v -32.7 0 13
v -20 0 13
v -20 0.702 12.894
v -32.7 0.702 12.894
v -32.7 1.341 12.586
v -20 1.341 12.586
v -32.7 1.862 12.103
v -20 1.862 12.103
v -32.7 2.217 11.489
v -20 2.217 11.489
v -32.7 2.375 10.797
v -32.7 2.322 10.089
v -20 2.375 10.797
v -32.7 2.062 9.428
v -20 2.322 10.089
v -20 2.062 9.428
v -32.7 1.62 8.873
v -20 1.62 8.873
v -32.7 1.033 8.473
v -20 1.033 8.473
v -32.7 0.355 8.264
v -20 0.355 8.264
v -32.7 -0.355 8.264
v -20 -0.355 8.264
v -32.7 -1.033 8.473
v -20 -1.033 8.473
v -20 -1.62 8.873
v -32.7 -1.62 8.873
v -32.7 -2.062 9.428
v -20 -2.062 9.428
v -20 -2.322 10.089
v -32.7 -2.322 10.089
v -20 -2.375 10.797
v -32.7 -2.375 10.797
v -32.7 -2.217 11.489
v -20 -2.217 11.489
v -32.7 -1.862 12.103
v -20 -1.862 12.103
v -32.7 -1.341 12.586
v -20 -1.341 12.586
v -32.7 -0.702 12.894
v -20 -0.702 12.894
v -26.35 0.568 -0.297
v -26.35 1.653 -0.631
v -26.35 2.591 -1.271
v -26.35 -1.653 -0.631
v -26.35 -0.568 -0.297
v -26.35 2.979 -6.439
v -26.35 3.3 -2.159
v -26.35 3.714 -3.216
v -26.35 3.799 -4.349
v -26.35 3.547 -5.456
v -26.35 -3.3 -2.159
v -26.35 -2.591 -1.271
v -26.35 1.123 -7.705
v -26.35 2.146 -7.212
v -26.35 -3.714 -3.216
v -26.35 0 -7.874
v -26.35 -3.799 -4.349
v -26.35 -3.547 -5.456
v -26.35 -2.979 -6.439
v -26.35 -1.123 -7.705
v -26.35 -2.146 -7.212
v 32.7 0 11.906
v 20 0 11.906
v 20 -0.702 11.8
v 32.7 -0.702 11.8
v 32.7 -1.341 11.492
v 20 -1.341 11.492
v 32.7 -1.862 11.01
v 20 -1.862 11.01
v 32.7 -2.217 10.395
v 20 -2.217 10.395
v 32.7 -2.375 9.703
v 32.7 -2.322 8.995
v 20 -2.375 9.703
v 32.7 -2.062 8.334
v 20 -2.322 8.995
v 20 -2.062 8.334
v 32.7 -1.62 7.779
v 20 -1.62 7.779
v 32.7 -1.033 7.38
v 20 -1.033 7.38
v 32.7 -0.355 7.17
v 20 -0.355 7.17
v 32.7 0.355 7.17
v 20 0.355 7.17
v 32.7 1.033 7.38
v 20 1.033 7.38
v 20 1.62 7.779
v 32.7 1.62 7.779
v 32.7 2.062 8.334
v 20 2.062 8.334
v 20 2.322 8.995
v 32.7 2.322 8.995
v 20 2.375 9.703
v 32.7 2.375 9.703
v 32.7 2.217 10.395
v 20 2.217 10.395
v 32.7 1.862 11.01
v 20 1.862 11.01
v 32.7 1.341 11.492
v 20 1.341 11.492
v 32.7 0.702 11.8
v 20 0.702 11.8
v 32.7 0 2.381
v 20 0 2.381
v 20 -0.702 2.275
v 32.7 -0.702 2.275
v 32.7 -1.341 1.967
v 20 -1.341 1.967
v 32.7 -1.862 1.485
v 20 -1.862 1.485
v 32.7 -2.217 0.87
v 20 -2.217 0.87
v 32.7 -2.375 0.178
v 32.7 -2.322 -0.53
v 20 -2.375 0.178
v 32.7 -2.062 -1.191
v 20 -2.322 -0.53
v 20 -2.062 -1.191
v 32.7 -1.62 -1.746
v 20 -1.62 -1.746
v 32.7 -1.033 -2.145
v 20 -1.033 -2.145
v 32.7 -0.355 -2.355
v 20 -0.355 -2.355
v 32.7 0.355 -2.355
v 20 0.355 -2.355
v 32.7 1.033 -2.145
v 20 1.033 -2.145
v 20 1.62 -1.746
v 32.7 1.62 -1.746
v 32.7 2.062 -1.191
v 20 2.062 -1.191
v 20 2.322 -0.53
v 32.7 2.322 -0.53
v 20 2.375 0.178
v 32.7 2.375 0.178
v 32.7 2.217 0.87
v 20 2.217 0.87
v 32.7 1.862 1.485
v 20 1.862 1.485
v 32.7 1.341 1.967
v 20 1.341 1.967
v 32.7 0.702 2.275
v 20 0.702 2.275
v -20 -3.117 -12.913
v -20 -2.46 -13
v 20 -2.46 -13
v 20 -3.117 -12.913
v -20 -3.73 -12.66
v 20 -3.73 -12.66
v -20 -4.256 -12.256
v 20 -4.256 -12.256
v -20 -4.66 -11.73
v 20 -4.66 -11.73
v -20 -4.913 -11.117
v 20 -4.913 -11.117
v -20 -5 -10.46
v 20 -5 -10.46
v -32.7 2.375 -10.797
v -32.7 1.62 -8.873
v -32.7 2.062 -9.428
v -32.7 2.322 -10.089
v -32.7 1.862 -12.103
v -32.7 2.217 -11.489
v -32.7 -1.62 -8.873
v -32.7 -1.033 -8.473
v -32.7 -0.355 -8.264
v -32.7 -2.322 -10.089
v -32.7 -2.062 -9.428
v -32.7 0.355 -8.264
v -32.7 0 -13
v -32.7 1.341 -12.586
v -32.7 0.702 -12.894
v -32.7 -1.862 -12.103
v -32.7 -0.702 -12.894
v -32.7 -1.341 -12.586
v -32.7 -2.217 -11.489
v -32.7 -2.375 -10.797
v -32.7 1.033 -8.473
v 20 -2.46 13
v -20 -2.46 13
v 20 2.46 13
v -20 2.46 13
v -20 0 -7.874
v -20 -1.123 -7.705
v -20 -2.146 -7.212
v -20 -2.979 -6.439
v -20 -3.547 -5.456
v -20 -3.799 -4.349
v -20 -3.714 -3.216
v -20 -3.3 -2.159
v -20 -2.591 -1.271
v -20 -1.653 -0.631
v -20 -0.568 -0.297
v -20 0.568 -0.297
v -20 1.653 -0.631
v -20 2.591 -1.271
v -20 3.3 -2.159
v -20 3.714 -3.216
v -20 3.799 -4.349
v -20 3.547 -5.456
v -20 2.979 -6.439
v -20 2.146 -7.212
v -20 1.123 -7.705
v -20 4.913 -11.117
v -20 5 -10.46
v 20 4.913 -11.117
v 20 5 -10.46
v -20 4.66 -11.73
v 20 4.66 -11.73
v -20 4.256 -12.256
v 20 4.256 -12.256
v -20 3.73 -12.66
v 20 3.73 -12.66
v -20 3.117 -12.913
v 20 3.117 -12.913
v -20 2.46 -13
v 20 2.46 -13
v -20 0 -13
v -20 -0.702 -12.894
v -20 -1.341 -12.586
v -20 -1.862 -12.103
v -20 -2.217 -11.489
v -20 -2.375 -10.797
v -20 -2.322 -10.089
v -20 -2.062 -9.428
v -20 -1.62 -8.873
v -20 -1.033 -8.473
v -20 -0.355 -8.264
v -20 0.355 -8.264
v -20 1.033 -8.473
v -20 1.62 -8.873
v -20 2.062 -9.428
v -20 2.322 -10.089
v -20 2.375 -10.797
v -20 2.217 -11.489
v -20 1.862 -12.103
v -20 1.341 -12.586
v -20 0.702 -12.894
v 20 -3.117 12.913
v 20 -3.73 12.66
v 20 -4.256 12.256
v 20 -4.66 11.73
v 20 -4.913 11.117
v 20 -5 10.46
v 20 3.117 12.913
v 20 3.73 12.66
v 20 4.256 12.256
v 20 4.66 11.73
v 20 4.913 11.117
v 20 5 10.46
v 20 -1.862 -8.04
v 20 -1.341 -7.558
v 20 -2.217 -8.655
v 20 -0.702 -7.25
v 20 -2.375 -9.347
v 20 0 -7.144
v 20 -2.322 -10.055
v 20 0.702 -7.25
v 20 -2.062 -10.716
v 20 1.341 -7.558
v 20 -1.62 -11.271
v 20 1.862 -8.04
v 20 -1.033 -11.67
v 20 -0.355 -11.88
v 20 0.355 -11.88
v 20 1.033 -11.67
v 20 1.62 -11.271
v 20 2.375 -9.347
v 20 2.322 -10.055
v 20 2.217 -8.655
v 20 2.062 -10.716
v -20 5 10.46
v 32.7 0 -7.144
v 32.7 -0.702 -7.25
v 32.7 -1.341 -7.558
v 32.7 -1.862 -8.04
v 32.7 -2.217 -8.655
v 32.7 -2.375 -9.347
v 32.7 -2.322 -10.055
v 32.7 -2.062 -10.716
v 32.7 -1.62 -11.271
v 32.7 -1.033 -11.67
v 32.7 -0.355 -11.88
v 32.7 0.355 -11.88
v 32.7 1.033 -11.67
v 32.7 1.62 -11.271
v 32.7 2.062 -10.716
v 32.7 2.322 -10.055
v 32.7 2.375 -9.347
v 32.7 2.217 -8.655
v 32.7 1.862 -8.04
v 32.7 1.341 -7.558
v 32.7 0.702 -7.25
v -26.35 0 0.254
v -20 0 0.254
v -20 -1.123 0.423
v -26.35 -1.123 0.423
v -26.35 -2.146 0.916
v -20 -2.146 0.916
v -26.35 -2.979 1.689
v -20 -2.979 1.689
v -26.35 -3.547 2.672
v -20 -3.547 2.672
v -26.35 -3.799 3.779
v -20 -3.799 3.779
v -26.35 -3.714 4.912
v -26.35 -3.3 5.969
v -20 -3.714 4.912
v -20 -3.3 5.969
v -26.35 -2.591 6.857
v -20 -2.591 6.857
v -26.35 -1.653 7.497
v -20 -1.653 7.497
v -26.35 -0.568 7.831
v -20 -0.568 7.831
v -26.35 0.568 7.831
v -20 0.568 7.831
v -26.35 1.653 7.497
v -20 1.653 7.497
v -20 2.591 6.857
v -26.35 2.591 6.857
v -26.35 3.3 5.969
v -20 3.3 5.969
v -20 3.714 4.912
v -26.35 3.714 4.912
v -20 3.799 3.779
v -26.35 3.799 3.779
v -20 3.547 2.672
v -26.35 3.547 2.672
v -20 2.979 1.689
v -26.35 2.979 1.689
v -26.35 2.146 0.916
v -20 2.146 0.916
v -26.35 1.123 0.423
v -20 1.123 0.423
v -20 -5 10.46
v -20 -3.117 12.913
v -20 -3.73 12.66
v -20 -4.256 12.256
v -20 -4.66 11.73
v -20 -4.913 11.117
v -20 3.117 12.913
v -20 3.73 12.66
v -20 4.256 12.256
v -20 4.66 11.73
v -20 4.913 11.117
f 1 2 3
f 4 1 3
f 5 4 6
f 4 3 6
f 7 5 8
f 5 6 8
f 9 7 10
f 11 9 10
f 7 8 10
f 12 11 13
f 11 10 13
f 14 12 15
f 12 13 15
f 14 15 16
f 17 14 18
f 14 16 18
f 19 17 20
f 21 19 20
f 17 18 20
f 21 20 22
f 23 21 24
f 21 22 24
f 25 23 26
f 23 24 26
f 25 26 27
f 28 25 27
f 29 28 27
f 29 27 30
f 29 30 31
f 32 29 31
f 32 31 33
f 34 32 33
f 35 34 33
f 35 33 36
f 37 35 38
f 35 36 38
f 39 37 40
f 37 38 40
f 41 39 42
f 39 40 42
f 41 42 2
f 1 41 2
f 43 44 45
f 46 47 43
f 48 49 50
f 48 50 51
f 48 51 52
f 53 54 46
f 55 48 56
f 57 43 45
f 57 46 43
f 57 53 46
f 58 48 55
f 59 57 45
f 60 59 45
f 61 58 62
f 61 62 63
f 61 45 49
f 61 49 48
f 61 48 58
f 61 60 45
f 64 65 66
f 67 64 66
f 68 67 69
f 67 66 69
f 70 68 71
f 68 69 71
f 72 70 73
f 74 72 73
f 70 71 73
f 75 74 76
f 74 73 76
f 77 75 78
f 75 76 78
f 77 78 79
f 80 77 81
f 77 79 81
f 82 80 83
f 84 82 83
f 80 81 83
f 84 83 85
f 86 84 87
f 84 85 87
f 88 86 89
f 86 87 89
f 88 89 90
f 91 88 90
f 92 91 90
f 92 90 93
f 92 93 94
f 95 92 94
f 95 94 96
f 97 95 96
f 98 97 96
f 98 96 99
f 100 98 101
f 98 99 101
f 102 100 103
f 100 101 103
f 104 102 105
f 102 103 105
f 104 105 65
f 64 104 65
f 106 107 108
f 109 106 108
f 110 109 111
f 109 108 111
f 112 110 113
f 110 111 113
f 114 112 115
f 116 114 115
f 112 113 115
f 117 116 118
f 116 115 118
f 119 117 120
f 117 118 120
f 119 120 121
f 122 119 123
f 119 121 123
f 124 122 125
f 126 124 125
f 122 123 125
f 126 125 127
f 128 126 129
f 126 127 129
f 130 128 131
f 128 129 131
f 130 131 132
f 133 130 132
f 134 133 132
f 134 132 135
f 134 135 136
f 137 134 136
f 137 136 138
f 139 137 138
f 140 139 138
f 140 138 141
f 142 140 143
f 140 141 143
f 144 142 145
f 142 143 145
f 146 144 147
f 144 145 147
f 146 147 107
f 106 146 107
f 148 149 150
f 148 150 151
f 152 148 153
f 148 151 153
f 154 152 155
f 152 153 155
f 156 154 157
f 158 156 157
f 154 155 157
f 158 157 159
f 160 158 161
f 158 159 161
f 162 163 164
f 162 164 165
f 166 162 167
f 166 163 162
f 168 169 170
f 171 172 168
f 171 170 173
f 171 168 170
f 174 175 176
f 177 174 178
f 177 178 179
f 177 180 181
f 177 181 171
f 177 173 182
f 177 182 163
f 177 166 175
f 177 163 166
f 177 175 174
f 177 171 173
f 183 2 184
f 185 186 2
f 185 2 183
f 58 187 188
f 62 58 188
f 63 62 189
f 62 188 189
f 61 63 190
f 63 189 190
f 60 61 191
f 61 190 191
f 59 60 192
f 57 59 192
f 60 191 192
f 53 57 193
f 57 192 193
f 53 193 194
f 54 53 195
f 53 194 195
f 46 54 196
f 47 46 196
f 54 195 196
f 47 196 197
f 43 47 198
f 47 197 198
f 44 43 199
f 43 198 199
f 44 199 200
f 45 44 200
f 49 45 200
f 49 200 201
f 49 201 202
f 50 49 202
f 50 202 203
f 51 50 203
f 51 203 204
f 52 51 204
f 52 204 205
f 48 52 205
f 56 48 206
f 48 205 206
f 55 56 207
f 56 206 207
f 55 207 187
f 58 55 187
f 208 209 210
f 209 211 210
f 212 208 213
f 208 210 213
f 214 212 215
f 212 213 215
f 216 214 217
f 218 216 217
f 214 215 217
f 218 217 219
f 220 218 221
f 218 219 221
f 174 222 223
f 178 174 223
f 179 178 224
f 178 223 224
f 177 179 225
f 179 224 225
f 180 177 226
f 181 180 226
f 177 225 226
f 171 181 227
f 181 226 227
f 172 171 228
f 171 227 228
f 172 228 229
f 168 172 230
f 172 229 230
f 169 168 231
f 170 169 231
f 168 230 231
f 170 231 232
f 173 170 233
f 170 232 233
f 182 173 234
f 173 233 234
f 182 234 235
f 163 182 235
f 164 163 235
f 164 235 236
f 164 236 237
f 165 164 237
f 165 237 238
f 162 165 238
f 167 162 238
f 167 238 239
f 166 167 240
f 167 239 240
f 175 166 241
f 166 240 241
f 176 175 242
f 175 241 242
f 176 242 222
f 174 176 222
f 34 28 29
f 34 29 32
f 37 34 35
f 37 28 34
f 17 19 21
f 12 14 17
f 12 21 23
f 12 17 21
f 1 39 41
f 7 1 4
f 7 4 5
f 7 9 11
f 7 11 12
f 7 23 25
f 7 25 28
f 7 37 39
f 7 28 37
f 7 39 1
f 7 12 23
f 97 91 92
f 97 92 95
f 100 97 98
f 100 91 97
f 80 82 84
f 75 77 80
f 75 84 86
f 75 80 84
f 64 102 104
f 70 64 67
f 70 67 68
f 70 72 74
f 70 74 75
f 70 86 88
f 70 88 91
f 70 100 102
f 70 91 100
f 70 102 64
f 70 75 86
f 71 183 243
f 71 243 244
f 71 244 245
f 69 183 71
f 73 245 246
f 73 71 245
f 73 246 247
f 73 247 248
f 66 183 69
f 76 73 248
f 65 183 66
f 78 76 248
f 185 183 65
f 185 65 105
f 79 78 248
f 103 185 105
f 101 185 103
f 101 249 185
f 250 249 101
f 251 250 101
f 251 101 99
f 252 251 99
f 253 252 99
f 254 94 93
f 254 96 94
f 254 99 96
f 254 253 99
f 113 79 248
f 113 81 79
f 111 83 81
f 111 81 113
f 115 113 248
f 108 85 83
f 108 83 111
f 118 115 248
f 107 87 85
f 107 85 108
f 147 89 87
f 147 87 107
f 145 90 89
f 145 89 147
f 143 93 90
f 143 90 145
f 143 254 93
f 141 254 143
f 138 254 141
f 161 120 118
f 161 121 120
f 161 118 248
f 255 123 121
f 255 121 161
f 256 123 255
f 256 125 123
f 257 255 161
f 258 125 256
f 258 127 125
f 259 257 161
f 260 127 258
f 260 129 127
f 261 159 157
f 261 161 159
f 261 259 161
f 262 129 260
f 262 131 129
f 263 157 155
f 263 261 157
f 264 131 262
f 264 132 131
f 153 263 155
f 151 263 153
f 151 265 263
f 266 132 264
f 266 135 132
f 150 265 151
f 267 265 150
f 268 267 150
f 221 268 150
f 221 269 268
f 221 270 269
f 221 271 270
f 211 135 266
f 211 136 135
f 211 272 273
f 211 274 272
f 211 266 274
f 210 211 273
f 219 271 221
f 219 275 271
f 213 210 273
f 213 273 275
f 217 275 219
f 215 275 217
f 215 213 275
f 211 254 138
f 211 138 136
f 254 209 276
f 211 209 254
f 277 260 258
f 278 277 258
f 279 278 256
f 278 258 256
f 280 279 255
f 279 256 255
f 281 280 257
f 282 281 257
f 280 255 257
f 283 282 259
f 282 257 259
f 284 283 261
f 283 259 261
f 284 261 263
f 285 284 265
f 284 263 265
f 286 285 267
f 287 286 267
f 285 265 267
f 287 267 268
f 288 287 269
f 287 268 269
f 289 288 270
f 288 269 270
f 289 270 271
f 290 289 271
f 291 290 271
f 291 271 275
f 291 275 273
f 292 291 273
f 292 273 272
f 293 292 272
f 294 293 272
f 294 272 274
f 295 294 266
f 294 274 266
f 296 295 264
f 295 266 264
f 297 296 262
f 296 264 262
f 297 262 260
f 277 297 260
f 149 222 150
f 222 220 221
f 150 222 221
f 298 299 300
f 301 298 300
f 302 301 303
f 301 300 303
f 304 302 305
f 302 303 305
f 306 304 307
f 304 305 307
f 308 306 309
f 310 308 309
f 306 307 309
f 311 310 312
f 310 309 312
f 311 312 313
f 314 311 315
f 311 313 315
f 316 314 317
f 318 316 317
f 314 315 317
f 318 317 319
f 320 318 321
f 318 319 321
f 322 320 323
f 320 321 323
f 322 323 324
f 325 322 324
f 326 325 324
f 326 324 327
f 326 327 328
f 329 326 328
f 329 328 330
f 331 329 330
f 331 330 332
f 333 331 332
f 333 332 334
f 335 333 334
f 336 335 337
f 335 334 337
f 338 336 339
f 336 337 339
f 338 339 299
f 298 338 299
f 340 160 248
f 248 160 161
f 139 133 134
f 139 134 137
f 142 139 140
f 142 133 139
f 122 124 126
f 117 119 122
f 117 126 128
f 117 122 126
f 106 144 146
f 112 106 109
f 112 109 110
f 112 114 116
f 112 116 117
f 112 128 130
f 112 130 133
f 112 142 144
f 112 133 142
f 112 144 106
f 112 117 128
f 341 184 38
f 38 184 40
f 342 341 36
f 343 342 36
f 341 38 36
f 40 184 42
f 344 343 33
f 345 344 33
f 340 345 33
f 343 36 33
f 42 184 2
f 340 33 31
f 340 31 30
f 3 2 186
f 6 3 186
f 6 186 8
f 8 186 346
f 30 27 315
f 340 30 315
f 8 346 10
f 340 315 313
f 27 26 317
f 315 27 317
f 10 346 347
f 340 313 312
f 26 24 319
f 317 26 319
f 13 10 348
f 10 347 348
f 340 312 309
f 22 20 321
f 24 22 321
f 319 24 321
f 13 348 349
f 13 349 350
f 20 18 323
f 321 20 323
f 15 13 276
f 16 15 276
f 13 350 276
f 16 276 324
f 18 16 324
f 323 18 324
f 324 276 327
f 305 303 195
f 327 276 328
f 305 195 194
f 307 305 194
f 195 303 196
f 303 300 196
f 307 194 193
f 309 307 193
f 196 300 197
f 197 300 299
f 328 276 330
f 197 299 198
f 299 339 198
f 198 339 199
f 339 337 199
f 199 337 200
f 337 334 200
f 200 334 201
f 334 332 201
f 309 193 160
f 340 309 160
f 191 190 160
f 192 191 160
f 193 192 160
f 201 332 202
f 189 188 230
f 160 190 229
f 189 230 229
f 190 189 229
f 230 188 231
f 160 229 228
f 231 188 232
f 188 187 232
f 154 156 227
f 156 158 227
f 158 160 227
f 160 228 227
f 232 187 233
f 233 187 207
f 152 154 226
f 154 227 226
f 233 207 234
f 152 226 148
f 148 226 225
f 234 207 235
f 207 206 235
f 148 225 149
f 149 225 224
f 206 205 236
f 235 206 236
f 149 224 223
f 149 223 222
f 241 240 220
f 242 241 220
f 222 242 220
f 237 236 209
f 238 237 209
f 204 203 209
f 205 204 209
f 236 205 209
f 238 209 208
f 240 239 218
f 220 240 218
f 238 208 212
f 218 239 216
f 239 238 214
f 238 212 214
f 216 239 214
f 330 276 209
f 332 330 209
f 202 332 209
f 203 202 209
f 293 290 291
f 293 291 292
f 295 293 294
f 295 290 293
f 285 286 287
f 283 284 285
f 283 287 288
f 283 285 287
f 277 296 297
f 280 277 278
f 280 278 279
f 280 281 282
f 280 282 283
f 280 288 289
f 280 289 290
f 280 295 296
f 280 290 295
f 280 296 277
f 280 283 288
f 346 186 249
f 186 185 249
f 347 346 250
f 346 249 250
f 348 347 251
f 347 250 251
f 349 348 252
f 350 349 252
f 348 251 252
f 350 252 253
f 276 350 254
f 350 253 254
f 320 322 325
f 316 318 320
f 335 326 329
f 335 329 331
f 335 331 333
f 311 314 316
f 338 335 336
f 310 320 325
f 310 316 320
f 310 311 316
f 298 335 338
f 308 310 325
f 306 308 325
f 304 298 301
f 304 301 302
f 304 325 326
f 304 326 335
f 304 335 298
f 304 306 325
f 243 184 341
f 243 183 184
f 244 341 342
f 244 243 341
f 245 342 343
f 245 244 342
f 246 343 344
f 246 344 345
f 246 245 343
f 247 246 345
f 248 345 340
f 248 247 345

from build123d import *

# Parameters (mm, degrees)
SKETCH1_W             = 40
SKETCH1_H             = 26
ESC_BODY_DEPTH        = 5
SKETCH2_R             = 2.38125
MOTOR_WIRES_DEPTH     = 12.7
SKETCH3_R             = 3.81
CAPACITOR_HEADS_DEPTH = 6.35
SKETCH4_R             = 2.38125
POWER_WIRES_DEPTH     = 12.7
FILLET1_R             = 2.54


with BuildPart() as part:
    # Sketch1 → ESC Body (new, symmetric)
    with BuildSketch(Plane(origin=(0, 0, 0), x_dir=(1, 0, 0), z_dir=(0, 1, 0))):
        Rectangle(SKETCH1_W, SKETCH1_H)
    extrude(amount=ESC_BODY_DEPTH, both=True)

    # Sketch2 → Motor Wires (add)
    with BuildSketch(Plane(origin=(20, 0, 0), x_dir=(0, 0, -1), z_dir=(1, 0, 0))):
        with Locations(Location((0, 0, 0), (0, 0, 180))):
            Circle(SKETCH2_R)
        with Locations(Location((-9.525, 0, 0), (0, 0, 180))):
            Circle(SKETCH2_R)
        with Locations(Location((9.525, 0, 0), (0, 0, 180))):
            Circle(SKETCH2_R)
    extrude(amount=MOTOR_WIRES_DEPTH)

    # Sketch3 → Capacitor Heads (add)
    with BuildSketch(Plane.ZY.offset(20)):
        with Locations(Location((-4.064, 0, 0), (0, 0, 180))):
            Circle(SKETCH3_R)
        with Locations(Location((4.064, 0, 0), (0, 0, 180))):
            Circle(SKETCH3_R)
    extrude(amount=CAPACITOR_HEADS_DEPTH)

    # Sketch4 → Power Wires (add)
    with BuildSketch(Plane.ZY.offset(20)):
        with Locations(Location((-10.61875, 0, 0), (0, 0, 180))):
            Circle(SKETCH4_R)
        with Locations((10.61875, 0)):
            Circle(SKETCH4_R)
    extrude(amount=POWER_WIRES_DEPTH)

    # Fillet1
    fillet1_edges = [part.edges().sort_by_distance(p)[0] for p in [
        (0, 5, 13),
        (0, -5, 13),
        (0, -5, -13),
        (0, 5, -13),
    ]]
    fillet(fillet1_edges, radius=FILLET1_R)


solid = part.part
